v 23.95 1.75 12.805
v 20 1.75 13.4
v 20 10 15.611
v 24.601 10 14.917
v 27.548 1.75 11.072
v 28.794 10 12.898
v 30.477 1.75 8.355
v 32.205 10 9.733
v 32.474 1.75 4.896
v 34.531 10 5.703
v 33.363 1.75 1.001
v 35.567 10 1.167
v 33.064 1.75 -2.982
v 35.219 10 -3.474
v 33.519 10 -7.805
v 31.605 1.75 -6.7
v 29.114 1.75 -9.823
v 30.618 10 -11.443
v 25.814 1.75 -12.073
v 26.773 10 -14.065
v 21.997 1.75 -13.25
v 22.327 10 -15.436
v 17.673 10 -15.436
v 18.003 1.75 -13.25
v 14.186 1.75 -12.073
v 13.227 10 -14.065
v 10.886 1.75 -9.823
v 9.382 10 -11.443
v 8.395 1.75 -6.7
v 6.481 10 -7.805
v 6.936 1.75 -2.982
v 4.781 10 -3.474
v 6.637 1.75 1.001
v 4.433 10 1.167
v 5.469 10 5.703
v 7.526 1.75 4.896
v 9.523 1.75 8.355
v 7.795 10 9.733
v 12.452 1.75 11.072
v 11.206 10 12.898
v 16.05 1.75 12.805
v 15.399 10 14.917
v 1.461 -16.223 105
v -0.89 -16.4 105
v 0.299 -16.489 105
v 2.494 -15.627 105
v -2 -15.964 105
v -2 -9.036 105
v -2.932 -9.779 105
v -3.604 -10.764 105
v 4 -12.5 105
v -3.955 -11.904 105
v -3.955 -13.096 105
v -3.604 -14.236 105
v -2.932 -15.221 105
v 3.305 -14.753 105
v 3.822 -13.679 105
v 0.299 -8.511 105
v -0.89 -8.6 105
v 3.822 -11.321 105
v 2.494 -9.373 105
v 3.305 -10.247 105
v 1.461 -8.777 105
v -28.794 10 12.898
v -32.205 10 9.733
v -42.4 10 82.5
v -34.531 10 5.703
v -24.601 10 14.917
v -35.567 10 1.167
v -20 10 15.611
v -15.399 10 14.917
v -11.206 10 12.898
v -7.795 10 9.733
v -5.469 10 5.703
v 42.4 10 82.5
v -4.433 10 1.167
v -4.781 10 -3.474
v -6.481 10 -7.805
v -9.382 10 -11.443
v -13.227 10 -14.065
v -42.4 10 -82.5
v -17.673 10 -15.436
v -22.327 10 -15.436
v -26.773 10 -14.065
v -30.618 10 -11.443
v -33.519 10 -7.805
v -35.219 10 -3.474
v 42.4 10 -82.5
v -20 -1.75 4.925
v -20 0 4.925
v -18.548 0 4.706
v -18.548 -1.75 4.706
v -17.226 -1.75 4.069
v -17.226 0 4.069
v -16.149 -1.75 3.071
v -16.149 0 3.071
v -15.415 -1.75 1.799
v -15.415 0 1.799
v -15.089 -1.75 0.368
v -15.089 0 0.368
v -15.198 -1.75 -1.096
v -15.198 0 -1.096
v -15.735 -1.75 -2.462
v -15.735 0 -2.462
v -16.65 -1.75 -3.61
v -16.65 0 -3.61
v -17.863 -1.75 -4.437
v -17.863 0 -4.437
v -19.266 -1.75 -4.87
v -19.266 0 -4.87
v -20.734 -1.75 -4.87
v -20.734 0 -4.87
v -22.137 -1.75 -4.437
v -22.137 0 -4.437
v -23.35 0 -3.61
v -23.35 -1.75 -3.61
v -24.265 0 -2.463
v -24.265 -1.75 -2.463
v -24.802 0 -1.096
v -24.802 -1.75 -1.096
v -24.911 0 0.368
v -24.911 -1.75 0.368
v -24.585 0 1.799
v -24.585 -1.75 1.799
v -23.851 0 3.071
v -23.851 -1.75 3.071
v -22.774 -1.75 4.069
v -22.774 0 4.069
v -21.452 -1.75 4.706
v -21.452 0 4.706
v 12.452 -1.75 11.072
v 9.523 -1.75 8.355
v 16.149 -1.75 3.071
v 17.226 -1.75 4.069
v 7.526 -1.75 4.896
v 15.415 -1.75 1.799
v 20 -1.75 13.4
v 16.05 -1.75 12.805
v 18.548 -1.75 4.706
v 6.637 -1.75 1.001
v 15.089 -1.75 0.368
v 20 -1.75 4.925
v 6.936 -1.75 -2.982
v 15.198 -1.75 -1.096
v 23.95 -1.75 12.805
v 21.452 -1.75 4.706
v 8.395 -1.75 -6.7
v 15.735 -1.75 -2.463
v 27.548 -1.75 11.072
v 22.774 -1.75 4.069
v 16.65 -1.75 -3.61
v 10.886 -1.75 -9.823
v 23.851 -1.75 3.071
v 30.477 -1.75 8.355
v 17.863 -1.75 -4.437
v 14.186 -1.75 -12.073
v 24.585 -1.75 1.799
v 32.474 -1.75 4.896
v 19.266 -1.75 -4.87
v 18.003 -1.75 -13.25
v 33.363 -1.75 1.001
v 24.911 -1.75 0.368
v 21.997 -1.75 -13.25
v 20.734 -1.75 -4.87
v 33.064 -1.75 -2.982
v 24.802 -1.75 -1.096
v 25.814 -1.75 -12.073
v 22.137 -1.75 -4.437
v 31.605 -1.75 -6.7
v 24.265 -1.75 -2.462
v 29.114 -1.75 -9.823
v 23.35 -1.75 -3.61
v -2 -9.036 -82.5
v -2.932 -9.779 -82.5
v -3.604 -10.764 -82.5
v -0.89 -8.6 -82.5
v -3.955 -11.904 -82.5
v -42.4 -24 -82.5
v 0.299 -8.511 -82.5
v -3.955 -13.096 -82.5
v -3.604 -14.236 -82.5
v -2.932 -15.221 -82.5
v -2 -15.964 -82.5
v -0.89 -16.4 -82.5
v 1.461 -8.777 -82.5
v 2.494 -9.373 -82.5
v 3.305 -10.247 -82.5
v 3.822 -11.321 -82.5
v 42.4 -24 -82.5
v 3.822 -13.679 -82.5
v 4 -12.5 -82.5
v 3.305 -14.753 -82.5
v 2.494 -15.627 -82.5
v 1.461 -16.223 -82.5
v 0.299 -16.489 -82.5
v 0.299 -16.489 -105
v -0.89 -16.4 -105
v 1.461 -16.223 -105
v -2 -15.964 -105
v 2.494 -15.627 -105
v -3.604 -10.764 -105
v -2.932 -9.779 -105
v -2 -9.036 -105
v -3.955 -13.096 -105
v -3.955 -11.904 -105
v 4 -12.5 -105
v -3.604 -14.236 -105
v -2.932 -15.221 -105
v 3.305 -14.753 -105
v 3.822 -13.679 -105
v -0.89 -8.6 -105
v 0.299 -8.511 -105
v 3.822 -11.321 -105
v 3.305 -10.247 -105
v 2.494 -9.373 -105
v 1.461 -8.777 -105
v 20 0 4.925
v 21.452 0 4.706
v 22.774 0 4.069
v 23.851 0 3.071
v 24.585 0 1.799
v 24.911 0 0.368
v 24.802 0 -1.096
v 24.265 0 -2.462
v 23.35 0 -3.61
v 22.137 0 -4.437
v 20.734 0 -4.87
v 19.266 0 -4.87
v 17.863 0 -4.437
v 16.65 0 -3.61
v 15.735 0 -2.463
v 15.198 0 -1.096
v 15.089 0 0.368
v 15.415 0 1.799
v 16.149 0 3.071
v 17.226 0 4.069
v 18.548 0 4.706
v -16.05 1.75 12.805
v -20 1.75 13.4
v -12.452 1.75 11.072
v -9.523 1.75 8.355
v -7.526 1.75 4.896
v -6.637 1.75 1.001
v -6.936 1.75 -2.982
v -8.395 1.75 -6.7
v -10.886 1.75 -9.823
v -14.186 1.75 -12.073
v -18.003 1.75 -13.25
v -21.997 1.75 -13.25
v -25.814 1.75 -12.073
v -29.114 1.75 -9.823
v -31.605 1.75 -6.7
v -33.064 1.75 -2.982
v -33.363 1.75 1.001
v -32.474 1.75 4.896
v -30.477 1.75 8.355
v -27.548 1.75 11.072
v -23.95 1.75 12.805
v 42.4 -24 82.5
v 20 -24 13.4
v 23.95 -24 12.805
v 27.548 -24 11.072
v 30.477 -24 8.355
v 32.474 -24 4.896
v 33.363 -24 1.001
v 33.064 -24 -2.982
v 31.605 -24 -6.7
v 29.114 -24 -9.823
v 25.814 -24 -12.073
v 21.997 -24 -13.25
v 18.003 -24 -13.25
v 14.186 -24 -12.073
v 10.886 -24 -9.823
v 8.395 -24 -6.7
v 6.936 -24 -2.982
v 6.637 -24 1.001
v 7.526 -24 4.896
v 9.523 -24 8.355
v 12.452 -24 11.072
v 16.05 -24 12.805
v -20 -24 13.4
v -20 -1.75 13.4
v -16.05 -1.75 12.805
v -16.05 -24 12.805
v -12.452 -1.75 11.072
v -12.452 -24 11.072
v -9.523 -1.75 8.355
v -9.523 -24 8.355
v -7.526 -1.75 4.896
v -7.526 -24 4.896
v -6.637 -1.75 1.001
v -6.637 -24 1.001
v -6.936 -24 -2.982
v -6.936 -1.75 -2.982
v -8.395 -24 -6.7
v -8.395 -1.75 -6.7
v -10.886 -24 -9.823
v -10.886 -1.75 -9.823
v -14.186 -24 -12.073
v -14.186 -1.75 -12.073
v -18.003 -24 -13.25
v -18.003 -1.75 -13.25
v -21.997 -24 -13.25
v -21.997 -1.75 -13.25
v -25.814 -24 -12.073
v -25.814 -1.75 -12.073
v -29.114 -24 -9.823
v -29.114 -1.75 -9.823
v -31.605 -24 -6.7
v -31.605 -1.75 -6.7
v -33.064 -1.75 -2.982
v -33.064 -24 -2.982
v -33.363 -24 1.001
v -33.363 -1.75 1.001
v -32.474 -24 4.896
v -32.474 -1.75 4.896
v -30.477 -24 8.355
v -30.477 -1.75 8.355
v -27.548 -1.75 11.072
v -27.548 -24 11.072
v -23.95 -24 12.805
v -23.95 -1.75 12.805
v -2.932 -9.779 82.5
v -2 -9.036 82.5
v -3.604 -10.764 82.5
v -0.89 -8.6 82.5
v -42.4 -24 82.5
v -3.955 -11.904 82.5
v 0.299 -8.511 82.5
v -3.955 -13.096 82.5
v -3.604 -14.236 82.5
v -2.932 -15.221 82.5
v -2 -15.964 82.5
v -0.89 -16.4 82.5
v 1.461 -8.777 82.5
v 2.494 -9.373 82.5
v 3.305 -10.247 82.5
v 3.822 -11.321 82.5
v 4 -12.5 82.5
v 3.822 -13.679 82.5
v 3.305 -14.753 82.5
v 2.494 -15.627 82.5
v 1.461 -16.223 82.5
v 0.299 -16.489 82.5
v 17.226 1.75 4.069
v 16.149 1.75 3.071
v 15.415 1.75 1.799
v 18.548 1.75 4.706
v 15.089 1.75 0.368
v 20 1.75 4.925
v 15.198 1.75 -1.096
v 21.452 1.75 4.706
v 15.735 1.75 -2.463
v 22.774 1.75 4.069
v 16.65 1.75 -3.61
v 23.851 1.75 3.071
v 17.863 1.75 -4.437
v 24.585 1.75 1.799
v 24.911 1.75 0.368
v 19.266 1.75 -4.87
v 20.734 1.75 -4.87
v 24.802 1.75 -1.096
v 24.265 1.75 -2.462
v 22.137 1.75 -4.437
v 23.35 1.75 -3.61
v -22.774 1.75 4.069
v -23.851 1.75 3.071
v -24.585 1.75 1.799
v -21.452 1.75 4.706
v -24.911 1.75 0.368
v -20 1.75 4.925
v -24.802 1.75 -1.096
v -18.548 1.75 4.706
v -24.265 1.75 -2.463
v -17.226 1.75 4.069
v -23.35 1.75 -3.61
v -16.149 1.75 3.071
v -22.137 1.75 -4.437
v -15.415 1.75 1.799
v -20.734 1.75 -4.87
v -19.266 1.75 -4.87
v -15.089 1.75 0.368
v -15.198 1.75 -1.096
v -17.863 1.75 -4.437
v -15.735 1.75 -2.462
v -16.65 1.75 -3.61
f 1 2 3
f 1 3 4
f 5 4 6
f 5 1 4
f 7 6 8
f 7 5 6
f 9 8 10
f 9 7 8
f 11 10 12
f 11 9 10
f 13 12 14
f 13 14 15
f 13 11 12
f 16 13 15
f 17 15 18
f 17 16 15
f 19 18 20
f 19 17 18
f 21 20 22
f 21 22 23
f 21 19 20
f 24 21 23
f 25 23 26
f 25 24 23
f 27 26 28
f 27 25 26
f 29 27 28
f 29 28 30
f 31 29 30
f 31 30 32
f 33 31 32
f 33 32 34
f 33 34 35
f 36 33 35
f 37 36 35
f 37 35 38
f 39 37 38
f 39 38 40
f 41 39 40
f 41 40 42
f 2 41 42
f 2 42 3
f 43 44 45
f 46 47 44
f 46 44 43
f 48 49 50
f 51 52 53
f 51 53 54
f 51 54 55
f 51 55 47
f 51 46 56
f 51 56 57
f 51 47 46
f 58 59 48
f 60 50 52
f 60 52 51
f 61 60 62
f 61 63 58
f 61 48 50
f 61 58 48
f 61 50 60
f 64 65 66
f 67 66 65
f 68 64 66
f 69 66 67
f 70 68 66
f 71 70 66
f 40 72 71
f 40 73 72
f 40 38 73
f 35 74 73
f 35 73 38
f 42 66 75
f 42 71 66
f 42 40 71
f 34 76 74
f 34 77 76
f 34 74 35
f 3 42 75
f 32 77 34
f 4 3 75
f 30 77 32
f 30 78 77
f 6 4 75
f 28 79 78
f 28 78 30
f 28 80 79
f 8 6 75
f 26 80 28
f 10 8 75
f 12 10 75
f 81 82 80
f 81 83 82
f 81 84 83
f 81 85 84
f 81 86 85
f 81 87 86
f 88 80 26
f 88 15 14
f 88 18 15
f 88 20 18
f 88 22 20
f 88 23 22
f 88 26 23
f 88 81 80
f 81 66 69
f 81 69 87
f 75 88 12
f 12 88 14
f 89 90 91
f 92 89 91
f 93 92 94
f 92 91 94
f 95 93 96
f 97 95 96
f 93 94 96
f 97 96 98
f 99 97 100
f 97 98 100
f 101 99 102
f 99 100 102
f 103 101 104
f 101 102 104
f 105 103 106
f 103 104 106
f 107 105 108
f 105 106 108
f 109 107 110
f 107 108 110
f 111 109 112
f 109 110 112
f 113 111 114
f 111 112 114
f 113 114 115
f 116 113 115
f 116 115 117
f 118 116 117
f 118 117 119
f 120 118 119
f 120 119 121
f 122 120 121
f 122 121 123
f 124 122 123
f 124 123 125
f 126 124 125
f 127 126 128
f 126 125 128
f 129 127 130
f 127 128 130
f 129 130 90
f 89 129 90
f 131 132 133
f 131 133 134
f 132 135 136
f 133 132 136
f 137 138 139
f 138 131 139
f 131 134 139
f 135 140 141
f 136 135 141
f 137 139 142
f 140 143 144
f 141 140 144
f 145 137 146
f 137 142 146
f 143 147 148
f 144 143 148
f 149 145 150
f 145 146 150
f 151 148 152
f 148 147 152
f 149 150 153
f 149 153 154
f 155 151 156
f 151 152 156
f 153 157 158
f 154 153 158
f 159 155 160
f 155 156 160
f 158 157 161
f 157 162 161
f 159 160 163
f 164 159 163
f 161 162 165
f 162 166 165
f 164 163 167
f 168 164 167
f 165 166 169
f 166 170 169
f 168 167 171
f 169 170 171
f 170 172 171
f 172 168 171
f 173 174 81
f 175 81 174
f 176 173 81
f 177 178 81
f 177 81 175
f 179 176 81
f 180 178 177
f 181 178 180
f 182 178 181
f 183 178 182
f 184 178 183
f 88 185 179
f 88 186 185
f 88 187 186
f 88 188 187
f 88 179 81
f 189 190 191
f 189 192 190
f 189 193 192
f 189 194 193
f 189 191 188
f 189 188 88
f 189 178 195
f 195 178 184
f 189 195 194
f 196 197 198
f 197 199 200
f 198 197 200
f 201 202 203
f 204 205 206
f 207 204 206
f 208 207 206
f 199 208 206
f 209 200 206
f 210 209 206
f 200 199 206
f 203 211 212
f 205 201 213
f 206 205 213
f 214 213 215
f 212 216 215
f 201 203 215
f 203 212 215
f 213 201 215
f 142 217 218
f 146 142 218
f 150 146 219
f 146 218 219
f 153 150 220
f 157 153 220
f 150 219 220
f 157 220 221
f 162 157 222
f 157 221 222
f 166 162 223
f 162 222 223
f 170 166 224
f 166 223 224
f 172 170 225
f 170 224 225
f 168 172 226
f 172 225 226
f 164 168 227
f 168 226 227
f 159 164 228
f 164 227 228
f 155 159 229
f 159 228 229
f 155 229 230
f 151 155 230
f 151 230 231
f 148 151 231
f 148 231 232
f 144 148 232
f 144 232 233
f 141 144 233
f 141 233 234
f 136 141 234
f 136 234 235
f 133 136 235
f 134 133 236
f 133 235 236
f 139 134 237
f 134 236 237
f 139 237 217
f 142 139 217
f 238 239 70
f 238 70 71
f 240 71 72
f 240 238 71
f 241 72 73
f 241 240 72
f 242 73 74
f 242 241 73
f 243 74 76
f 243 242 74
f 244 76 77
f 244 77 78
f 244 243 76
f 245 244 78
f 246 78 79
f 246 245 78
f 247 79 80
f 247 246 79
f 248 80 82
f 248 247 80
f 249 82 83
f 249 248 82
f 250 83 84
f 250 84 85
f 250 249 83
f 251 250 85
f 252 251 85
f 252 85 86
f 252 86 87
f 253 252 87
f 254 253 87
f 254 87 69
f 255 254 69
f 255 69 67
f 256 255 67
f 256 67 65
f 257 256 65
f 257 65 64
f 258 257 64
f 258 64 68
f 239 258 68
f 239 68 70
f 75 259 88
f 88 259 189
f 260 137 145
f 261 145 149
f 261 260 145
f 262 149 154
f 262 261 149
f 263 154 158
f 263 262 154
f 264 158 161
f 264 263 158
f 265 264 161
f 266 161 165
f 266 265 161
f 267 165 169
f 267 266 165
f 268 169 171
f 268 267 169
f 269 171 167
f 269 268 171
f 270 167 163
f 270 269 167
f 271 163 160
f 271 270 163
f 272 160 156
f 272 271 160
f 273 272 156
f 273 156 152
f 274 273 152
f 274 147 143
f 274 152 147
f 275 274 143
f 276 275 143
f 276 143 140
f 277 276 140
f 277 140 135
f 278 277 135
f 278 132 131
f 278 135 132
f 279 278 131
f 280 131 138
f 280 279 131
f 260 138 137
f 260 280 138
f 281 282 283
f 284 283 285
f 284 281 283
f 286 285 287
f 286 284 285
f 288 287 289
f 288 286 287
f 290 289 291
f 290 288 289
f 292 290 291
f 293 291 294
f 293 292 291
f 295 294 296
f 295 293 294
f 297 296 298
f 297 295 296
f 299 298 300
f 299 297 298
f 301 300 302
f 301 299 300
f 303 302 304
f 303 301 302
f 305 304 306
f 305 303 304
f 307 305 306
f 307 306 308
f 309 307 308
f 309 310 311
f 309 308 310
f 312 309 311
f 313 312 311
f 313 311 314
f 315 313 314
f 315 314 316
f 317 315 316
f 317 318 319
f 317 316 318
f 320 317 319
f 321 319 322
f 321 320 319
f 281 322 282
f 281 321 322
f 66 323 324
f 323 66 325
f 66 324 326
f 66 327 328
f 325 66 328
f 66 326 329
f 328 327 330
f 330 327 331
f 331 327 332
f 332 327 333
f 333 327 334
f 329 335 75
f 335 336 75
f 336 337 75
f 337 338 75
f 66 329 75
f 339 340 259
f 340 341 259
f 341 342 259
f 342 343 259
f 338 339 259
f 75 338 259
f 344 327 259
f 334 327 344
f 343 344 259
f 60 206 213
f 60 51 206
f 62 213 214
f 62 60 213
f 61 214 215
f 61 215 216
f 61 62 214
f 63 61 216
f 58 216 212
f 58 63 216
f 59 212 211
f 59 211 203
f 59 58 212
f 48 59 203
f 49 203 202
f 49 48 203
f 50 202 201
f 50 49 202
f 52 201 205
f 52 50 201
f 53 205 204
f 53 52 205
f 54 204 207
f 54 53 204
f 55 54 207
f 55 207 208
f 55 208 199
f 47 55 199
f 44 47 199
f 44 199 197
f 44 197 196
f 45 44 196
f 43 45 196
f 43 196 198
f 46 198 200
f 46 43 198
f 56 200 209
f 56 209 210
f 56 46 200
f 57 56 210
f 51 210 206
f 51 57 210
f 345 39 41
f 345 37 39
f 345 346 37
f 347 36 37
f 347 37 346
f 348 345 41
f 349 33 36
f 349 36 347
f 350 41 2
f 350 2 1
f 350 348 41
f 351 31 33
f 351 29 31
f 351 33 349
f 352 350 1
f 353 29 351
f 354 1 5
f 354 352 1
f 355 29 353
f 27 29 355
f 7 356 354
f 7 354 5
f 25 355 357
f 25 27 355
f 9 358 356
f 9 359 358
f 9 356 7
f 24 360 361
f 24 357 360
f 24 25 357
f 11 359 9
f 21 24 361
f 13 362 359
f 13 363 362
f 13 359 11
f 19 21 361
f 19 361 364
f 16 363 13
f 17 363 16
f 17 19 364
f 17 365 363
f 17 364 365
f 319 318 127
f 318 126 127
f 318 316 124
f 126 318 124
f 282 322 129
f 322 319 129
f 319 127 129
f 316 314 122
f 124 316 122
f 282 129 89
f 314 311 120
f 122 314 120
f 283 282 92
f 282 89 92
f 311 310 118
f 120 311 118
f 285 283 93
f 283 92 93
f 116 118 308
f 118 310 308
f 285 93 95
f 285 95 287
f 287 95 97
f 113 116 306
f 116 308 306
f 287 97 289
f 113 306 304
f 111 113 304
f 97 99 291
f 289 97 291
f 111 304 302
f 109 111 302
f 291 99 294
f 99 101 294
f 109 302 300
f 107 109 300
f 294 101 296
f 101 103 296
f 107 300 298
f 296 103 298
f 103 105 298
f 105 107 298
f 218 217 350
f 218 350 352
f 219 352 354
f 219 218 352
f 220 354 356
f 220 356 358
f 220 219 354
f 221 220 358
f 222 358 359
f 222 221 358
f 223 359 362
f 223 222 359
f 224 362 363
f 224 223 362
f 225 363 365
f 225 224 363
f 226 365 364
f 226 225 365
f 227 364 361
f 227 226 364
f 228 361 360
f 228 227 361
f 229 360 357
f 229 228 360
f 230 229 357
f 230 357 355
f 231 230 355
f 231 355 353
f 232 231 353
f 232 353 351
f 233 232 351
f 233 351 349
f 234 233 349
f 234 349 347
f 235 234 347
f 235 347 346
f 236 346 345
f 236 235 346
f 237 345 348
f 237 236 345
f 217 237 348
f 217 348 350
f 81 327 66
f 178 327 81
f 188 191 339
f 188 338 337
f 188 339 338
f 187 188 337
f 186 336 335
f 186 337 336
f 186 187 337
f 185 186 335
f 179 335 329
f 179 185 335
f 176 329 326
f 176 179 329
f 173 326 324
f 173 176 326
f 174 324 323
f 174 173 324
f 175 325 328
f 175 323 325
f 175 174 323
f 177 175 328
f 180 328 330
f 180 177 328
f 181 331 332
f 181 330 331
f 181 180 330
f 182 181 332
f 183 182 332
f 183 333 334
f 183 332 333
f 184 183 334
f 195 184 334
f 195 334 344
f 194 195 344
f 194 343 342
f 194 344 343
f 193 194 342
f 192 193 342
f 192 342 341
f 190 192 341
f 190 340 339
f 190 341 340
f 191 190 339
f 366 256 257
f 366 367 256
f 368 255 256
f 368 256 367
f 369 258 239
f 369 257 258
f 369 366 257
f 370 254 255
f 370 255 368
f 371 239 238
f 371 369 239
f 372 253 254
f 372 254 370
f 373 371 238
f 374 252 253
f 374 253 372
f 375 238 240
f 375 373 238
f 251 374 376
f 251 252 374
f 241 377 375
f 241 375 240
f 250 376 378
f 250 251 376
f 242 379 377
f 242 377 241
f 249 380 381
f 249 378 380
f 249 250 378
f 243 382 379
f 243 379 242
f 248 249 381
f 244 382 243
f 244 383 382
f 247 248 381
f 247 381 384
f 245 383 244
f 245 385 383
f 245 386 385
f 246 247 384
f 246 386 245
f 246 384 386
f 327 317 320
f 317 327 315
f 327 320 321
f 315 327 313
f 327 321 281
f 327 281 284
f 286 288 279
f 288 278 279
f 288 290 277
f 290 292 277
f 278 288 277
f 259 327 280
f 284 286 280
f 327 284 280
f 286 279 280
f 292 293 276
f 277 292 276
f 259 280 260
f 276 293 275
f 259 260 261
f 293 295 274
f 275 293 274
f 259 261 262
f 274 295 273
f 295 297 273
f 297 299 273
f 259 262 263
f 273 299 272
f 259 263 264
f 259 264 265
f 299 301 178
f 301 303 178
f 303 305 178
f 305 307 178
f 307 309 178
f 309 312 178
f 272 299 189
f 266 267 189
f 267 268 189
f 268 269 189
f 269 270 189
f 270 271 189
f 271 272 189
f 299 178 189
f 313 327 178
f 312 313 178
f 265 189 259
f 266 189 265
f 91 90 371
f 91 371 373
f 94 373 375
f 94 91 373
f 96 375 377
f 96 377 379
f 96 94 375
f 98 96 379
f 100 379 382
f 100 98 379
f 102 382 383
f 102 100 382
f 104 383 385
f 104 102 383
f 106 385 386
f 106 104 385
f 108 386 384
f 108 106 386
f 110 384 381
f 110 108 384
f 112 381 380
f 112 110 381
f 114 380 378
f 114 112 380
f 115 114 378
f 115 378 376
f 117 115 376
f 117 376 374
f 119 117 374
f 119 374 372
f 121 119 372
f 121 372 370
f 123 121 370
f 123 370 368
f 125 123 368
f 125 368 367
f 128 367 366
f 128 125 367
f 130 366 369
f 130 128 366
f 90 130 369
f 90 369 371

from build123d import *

# Parameters (mm, degrees)
SKETCH1_W               = 84.8
SKETCH1_H               = 165
SKETCH1_R               = 4.925
BOSS_EXTRUDE1_DEPTH     = 1.75
SKETCH1_3_W             = 84.8
SKETCH1_3_H             = 165
SKETCH1_3_R             = 13.4
BOSS_EXTRUDE2_DEPTH     = 10
BOSS_EXTRUDE3_START     = -24
SKETCH1_4_W             = 84.8
SKETCH1_4_H             = 165
SKETCH1_4_R             = 13.4
BOSS_EXTRUDE3_DEPTH     = 24
DRAFT1_ANGLE            = 15
CUT_EXTRUDE1_DEPTH      = 96.812368721
CUT_EXTRUDE1_DEPTH_BACK = 96.812368721
SKETCH5_R               = 4
SKETCH5_2_R             = 4
BOSS_EXTRUDE4_DEPTH     = 105


with BuildPart() as part:
    # Sketch1 → Boss-Extrude1 (new, symmetric)
    with BuildSketch(Plane(origin=(0, 0, 0), x_dir=(1, 0, 0), z_dir=(0, 1, 0))):
        Rectangle(SKETCH1_W, SKETCH1_H)
        with Locations((-20, 0)):
            Circle(SKETCH1_R, mode=Mode.SUBTRACT)
        with Locations((20, 0)):
            Circle(SKETCH1_R, mode=Mode.SUBTRACT)
    extrude(amount=BOSS_EXTRUDE1_DEPTH, both=True)

    # Sketch1<3> → Boss-Extrude2 (add)
    with BuildSketch(Plane(origin=(0, 0, 0), x_dir=(1, 0, 0), z_dir=(0, 1, 0))):
        Rectangle(SKETCH1_3_W, SKETCH1_3_H)
        with Locations((-20, 0)):
            Circle(SKETCH1_3_R, mode=Mode.SUBTRACT)
        with Locations((20, 0)):
            Circle(SKETCH1_3_R, mode=Mode.SUBTRACT)
    extrude(amount=BOSS_EXTRUDE2_DEPTH)

    # Sketch1<4> → Boss-Extrude3 (add)
    with BuildSketch(Plane(origin=(0, 0, 0), x_dir=(1, 0, 0), z_dir=(0, 1, 0)).offset(BOSS_EXTRUDE3_START)):
        Rectangle(SKETCH1_4_W, SKETCH1_4_H)
        with Locations((-20, 0)):
            Circle(SKETCH1_4_R, mode=Mode.SUBTRACT)
        with Locations((20, 0)):
            Circle(SKETCH1_4_R, mode=Mode.SUBTRACT)
    extrude(amount=BOSS_EXTRUDE3_DEPTH)

    # Draft1
    draft1_faces = [part.faces().sort_by_distance(p)[0] for p in [
        (-33.4, 5.875, 0),
        (6.6, 5.875, 0),
    ]]
    draft(draft1_faces, Plane.ZX.offset(1.75), DRAFT1_ANGLE)

    # Sketch5 → Cut-Extrude1 (cut, two sides: drawn at the far end of the back side and taken through both)
    with BuildSketch(Plane.XY.offset(-CUT_EXTRUDE1_DEPTH_BACK)):
        with Locations((0, -12.5)):
            Circle(SKETCH5_R)
    extrude(amount=CUT_EXTRUDE1_DEPTH + CUT_EXTRUDE1_DEPTH_BACK, mode=Mode.SUBTRACT)


with BuildPart() as body_2:
    # Sketch5<2> → Boss-Extrude4 (new, symmetric)
    with BuildSketch(Plane.XY):
        with Locations((0, -12.5)):
            Circle(SKETCH5_2_R)
    extrude(amount=BOSS_EXTRUDE4_DEPTH, both=True)


solid = Compound([part.part, body_2.part])
